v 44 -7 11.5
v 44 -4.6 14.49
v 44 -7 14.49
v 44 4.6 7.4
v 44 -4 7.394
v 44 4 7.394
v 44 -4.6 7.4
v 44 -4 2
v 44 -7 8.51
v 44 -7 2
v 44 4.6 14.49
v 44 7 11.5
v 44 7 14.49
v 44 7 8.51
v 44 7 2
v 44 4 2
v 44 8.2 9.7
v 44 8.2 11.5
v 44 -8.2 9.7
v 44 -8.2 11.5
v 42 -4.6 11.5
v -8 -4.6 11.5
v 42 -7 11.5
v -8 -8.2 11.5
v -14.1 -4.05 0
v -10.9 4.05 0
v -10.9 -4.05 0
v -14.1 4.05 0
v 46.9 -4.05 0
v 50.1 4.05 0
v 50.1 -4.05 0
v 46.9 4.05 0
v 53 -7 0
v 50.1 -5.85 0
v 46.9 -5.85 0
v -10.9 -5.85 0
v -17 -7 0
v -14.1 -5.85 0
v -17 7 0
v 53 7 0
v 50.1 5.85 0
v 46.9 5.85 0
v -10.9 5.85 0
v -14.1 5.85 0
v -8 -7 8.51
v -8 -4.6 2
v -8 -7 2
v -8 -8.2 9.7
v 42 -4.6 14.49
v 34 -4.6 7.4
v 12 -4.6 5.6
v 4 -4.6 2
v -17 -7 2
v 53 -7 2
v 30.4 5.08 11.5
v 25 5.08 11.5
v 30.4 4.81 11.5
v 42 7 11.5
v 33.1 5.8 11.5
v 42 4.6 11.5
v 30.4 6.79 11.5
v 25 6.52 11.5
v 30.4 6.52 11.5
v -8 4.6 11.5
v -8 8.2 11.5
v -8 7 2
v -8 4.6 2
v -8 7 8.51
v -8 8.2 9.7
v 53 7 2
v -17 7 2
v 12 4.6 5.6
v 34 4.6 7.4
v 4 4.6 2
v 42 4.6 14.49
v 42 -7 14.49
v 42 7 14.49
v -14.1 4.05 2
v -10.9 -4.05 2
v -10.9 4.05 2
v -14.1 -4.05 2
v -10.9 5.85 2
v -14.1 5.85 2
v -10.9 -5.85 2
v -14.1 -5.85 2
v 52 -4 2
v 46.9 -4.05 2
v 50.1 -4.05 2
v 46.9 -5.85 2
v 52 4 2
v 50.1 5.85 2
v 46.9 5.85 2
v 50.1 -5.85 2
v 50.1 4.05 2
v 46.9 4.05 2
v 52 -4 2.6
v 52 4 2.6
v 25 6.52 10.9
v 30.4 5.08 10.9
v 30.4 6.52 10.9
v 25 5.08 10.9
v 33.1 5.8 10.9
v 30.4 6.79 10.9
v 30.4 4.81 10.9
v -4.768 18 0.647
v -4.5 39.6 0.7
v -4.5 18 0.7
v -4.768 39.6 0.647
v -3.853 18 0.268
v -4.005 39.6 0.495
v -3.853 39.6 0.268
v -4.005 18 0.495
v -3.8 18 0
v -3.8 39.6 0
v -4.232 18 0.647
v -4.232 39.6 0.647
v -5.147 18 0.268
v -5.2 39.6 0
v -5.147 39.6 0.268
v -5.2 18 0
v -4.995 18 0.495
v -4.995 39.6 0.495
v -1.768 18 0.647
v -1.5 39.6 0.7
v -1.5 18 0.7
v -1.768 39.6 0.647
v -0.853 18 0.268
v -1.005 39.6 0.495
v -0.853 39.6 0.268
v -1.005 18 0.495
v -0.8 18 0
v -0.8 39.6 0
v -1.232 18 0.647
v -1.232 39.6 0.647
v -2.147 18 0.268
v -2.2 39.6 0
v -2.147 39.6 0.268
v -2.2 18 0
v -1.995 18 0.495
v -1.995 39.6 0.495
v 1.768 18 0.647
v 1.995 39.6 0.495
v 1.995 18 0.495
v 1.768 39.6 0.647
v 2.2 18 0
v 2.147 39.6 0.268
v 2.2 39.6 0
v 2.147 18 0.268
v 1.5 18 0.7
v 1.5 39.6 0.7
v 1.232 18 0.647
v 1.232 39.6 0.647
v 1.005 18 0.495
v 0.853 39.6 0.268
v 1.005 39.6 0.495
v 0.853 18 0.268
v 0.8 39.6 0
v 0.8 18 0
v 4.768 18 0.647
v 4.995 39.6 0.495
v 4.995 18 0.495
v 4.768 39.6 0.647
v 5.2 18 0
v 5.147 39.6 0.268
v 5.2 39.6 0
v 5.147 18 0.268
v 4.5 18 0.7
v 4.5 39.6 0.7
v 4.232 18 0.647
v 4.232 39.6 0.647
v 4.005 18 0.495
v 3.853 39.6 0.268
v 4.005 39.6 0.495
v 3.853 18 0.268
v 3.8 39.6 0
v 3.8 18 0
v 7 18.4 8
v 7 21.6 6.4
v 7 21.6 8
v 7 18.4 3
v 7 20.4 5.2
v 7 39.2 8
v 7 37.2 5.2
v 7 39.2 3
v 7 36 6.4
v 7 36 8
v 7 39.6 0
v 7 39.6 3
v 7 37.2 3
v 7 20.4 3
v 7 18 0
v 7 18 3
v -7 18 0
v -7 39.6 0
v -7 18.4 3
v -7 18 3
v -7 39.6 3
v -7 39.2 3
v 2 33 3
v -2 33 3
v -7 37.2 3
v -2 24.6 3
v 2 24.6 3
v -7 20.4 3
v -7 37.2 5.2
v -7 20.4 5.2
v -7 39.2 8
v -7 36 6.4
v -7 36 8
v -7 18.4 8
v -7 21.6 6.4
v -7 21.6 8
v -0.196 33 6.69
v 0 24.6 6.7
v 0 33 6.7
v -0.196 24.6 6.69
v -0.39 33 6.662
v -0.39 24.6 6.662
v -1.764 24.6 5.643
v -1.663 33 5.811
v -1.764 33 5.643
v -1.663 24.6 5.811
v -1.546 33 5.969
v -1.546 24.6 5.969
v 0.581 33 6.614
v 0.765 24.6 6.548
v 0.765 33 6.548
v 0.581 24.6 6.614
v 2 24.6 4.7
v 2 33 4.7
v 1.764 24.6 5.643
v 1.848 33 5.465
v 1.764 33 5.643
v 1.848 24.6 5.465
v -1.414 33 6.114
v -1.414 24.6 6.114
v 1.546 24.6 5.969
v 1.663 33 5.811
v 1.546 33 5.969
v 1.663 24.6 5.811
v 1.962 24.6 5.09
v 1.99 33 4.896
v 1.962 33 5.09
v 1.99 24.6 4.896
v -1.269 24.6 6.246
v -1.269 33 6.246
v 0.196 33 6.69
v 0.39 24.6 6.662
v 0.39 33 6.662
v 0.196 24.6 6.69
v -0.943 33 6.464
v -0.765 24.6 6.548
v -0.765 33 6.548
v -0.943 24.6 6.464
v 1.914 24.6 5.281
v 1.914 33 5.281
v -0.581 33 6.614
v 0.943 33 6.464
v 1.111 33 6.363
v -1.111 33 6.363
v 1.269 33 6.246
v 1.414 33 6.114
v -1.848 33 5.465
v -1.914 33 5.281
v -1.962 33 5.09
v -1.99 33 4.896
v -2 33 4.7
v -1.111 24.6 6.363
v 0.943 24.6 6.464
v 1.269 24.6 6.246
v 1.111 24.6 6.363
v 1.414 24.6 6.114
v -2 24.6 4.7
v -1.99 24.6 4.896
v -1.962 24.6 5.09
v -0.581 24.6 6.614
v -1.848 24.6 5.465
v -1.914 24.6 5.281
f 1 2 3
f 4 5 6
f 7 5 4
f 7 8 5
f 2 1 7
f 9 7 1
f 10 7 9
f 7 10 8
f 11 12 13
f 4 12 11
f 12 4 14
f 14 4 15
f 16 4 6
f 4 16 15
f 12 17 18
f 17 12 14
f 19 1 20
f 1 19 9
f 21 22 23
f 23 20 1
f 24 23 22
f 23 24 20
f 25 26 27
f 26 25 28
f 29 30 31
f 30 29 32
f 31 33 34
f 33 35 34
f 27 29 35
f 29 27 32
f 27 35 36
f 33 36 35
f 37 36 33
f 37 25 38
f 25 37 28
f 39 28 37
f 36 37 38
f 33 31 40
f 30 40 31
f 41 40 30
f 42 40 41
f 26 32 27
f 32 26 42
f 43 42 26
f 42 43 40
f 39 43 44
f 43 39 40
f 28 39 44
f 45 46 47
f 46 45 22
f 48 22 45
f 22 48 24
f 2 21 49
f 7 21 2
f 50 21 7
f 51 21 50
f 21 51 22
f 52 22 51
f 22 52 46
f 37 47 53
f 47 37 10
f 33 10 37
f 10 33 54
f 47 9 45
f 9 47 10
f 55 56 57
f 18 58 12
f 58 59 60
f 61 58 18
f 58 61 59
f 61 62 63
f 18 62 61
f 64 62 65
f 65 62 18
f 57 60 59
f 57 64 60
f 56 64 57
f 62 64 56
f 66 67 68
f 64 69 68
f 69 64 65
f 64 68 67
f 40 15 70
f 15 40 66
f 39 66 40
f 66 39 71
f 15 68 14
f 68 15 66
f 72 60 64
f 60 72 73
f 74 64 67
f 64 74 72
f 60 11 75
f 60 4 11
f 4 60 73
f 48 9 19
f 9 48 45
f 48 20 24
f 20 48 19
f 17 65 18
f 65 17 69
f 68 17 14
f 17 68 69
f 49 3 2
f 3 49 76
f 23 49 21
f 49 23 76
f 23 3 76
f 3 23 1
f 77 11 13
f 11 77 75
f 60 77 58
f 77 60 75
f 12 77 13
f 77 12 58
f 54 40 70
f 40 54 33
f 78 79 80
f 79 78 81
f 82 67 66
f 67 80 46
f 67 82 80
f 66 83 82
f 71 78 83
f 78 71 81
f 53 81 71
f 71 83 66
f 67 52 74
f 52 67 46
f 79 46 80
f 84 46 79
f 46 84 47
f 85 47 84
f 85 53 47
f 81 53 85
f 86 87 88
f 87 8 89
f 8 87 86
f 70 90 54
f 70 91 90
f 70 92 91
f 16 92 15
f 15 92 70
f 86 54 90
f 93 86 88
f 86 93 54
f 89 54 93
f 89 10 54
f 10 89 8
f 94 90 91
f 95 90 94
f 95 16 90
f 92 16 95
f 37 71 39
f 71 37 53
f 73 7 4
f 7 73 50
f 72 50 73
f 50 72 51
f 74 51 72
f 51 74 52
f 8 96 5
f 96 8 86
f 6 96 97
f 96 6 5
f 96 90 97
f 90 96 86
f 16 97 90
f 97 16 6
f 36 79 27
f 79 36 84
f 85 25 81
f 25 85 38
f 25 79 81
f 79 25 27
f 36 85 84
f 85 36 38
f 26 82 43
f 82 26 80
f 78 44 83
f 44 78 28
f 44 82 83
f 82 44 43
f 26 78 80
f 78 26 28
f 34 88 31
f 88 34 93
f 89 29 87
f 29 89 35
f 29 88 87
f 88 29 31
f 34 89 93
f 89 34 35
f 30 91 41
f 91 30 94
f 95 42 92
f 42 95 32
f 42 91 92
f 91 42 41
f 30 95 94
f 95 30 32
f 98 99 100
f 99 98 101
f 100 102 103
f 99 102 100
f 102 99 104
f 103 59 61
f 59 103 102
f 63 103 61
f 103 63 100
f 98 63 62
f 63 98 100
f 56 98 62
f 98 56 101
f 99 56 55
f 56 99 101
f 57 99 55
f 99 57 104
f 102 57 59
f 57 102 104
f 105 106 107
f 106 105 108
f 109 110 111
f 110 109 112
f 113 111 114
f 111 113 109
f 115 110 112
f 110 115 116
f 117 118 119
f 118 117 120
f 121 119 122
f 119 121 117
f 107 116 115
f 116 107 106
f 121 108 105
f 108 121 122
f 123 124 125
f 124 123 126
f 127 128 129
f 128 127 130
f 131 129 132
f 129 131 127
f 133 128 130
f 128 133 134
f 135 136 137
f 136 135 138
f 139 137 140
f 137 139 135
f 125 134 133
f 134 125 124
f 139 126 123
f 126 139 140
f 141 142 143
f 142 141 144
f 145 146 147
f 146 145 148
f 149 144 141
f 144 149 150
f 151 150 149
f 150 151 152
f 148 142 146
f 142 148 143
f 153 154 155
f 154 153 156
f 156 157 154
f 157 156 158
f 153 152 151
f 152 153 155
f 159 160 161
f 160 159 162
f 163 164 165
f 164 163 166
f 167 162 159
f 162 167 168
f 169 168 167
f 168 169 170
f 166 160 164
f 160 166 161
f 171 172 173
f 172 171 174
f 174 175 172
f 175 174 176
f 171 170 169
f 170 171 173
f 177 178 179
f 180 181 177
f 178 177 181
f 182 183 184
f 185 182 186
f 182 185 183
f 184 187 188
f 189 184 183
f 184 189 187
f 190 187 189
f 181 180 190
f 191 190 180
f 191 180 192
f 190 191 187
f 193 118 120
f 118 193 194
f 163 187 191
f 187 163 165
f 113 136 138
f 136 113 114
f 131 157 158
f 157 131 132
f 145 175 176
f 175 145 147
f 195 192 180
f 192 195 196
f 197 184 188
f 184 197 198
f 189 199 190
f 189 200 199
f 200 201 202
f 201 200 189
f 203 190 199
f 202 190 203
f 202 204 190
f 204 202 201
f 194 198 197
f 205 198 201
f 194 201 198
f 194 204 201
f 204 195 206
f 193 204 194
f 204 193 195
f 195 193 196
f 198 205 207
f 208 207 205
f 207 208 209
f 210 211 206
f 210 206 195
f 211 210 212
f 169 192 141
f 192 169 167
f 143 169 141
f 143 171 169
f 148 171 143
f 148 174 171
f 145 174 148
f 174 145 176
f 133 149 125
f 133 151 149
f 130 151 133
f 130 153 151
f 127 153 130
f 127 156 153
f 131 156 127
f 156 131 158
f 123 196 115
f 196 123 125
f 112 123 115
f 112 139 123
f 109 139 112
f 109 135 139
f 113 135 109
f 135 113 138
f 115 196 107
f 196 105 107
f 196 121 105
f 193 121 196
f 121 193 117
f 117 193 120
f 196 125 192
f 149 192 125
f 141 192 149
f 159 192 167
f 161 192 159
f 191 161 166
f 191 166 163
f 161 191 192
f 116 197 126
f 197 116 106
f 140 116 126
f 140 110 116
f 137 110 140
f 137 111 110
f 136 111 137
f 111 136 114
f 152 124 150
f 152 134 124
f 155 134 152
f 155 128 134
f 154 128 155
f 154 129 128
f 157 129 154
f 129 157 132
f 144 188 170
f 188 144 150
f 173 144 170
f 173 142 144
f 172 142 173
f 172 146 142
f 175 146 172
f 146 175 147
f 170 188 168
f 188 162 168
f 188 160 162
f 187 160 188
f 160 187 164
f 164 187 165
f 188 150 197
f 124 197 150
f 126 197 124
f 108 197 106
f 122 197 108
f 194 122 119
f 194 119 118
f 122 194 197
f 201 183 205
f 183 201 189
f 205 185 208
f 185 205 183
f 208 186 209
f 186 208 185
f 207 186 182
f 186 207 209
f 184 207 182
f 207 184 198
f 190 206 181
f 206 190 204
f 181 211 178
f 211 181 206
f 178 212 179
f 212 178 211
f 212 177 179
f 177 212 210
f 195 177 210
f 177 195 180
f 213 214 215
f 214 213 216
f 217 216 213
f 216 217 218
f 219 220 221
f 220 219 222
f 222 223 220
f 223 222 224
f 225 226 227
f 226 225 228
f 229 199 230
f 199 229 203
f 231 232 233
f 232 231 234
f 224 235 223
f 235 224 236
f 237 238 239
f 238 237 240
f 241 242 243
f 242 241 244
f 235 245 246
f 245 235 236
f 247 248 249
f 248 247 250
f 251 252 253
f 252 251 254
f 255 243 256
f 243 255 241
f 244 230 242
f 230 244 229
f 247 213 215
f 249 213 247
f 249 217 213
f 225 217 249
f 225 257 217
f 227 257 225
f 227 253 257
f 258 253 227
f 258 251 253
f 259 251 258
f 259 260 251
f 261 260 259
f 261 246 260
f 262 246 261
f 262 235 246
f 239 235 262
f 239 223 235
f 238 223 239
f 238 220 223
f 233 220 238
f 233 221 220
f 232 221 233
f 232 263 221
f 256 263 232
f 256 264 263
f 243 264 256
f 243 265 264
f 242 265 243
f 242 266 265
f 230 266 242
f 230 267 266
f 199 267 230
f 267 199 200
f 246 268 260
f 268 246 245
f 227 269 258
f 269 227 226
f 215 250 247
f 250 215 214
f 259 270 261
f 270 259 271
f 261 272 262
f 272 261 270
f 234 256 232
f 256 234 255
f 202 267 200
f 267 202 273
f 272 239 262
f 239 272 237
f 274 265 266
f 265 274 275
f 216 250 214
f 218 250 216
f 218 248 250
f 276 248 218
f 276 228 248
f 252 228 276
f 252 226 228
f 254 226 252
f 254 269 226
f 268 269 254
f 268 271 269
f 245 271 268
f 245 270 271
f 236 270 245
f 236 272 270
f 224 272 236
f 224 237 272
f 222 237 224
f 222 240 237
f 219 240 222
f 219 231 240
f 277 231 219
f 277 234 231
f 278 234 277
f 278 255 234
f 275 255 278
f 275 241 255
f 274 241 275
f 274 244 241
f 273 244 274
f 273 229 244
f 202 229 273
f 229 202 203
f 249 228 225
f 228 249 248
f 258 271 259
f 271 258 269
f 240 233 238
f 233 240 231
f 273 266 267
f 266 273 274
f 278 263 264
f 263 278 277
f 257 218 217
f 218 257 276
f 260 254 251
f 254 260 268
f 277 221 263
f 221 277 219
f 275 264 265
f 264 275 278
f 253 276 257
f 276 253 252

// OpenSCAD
// file: params.scad
// BubbleLink printed parts: shared measurements and fit settings.
//
// Every model in this folder includes this file. Edit a value here, re-run
// build.sh, and every affected STL is regenerated.
//
// Each value is tagged with where it came from:
//   [VERIFIED]  datasheet, PCB release package, or canonical-facts.md
//   [LISTING]   seller listing claim; plausible but not measured
//   [ESTIMATE]  nobody has measured it; MEASURE THE PART before a long print
//
// All dimensions in mm.

$fn = 64;

// ---------------------------------------------------------------- printing
fit_clear   = 0.30;   // clearance per side for a part dropping into a pocket
slide_clear = 0.20;   // clearance per side for the slide-clamp dovetail
ziptie_w    = 3.2;    // slot width for the narrow zip ties on hand
ziptie_t    = 1.8;    // slot thickness

// ---------------------------------------------------------------- 18650 cells
cell_d      = 18.33;  // [VERIFIED] Samsung INR18650-25R, +/-0.07
cell_h      = 64.85;  // [VERIFIED] +/-0.15
cell_bore   = 18.80;  // pocket diameter; tune with fit_coupon (18.65/18.80/18.95)
cell_pitch  = 19.90;  // centre-to-centre. Gives a ~1.6 mm wrapper gap and a
                      // printable 1.1 mm rib. Keep <= 21 so the 26 mm nickel
                      // tabs still reach both cell centres.
holder_t    = 10.0;   // spacer thickness along the cell axis
holder_lip  = 2.0;    // retaining lip under each cell end
holder_wall = 2.4;    // outer wall around the cell group
cap_window  = 12.5;   // opening in the lip for spot-welding the tabs

// ---------------------------------------------------------------- tubing
tube_od     = 5.5;    // [VERIFIED order] 3.5 ID x 5.5 OD silicone
tube_wall   = 1.0;
tube_flat_w = 8.8;    // width of the tube when pinched flat (pi*OD/2 + margin)

// ---------------------------------------------------------------- connectors
// AMASS XT30U / XT60H housings. Datasheet-nominal; tune with fit_coupon.
xt30_w      = 10.2;   // [ESTIMATE] across the housing
xt30_h      =  5.3;   // [ESTIMATE]
xt60_w      = 16.0;   // [ESTIMATE] XT60H with sheath
xt60_h      =  8.4;   // [ESTIMATE]

// ---------------------------------------------------------------- umbilical
awg16_od    = 3.2;    // [ESTIMATE] 16 AWG silicone insulation OD
awg12_od    = 4.0;    // [ESTIMATE] 12 AWG silicone insulation OD
usb_od      = 4.0;    // [ESTIMATE] LED-backpack USB cable OD
pump_od     = 2.0;    // [ESTIMATE] G528 motor lead insulation OD
paracord_d  = 4.0;    // [LISTING] 550 cord, 4 mm

// ---------------------------------------------------------------- PCB
// [VERIFIED] BubbleLink CTRL v1.2: 50 x 40 x 1.6 mm, NPTH H1-H4 3.2 mm at
// (+/-21.5, +/-16.5) from board centre.
pcb_w       = 50.0;
pcb_h       = 40.0;
pcb_hole_dx = 43.0;
pcb_hole_dy = 33.0;
pcb_hole_d  = 3.2;
pcb_standoff = 6.0;   // board underside height above the tray
// main file
// Slide clamp for the 3.5 x 5.5 mm silicone tube. Print three:
//   1x bypass restrictor (pump outlet tee -> clamp -> check valve)
//   2x channel shutoff (one per gun channel)
//
// The tube lies in a channel whose floor ramps up. A slider rides on dovetail
// rails over the channel; a rounded ridge under it squeezes the tube against
// the floor. Slide toward the tunnel end to close.
//   x = -8 .. 4    gap 6.0 mm   tube fully open (load the slider here)
//   x =  4 .. 12   gap 6.0 -> 2.4 (coarse)
//   x = 12 .. 34   gap 2.4 -> 0.6 (fine: 1 mm of travel = ~0.08 mm of gap)
//   x = 34 .. 44   gap 0.6     tube sealed (1.0 with the dovetail's play)
// Stop blocks on the wall tops halt the slider with the ridge at x = 35, in
// the sealed zone. The tube stays at the sealed-floor height to the end of
// the body, so it is never kinked. The shallow ramp is self-locking, so the
// slider stays where it is put; no screw needed.
//
// part = "body"   print upright, base on the bed
// part = "slider" print upside down, flat top on the bed
// part = "both"   plated together for one print job
// Both PETG, no supports. Tie the tube down through the tail slots.

include <params.scad>

part = "both";

wc = tube_flat_w + 0.4;    // channel width: room for the tube flattened
t  = 2.4;                  // wall thickness
H  = 9.5;                  // wall top / slider underside
nose_z = 6.0;              // lowest point of the ridge above the floor datum
lip = 1.2;                 // dovetail lip
c  = slide_clear;
yw = wc / 2 + t;           // wall outer face
base = 2.0;                // base plate thickness below the floor datum
x0 = -8; x_stop = 37; x1 = 44;   // body start, end of ramp, body end
tail = 9;

// floor height along x
fl = [[x0, 0], [4, 0], [12, 3.6], [34, 5.4], [x1, 5.4]];

module body() {
    difference() {
        union() {
            // base plate including the tie-down tails
            translate([x0 - tail, -yw, -base]) cube([x1 - x0 + 2 * tail, 2 * yw, base]);
            // walls
            for (s = [-1, 1]) translate([x0, s > 0 ? wc / 2 : -yw, -base])
                cube([x1 - x0, t, H + base]);
            // dovetail lips with a 45-degree underside
            for (s = [-1, 1]) mirror([0, s > 0 ? 0 : 1, 0])
                translate([x0, 0, 0]) rotate([90, 0, 90])
                    linear_extrude(x1 - x0)
                        polygon([[yw - 0.01, H - 3], [yw + lip, H - 3 + lip],
                                 [yw + lip, H], [yw - 0.01, H]]);
            // ramp floor
            rotate([90, 0, 0]) translate([0, 0, -wc / 2 - 0.01])
                linear_extrude(wc + 0.02)
                    polygon(concat([[x0, -0.01]], fl, [[x1, -0.01]]));
            // exit ramp on the tail, so the tube eases back down to the
            // tie-down level instead of kinking over the end of the floor
            rotate([90, 0, 0]) translate([0, 0, -wc / 2 + 0.6])
                linear_extrude(wc - 1.2)
                    polygon([[x1 - 0.01, -0.01], [x1 - 0.01, 5.4], [x1 + tail - 1, 0.6], [x1 + tail - 1, -0.01]]);
            // stop blocks on the wall tops: the slider plate hits them with
            // its ridge at x = 35, inside the sealed zone
            for (s = [-1, 1]) translate([x_stop + sl_len / 2 - 2, s > 0 ? wc / 2 : -yw, H - 0.01])
                cube([x1 - (x_stop + sl_len / 2 - 2), t, 3]);
        }
        // tie-down slots in the tails, either side of the tube
        for (x = [x0 - tail / 2, x1 + tail / 2], s = [-1, 1])
            translate([x, s * (tube_od / 2 + 2.2), 0])
                cube([ziptie_w, ziptie_t, 3 * base + 2], center = true);
        // arrow on the wall top pointing toward "closed"
        translate([x_stop - 12, yw - t / 2, H - 0.6])
            linear_extrude(1) polygon([[0, -0.8], [6, -0.8], [6, -1.1], [9, 0], [6, 1.1], [6, 0.8], [0, 0.8]] * 0.9);
    }
}

sl_len = 14;
sk = 2.0;                  // skirt thickness
yo = yw + lip + c + sk;    // slider outer half-width

module slider() {
    // modelled in its working position, ridge centre at x = 0
    union() {
        difference() {
            translate([-sl_len / 2, -yo - 0.4, H + c]) cube([sl_len, 2 * yo + 0.8, 3]);
            // thumb grip grooves
            for (x = [-4.5 : 3 : 4.5]) translate([x, 0, H + c + 3])
                rotate([90, 0, 0]) cylinder(d = 1.4, h = 2 * yo + 2, center = true, $fn = 16);
        }
        for (s = [-1, 1]) mirror([0, s > 0 ? 0 : 1, 0])
            translate([-sl_len / 2, 0, 0]) rotate([90, 0, 90]) linear_extrude(sl_len)
                polygon([
                    [yw + lip + c,      H + c + 0.5],
                    [yw + lip + c,      H - 1.8 - c],          // under the lip
                    [yw + c,            H - 3 - c],
                    [yw + c,            H - 3 - c - 1.6],
                    [yo,                H - 3 - c - 1.6],
                    [yo,                H + c + 0.5]]);
        // ridge: rounded nose, flat back up to the plate
        hull() {
            translate([0, 0, nose_z + 2]) rotate([90, 0, 0])
                cylinder(r = 2, h = wc - 2 * c - 0.4, center = true);
            translate([-2, -(wc - 2 * c - 0.4) / 2, H + c]) cube([4, wc - 2 * c - 0.4, 0.01]);
        }
    }
}

if (part == "body") translate([0, 0, base]) body();
else if (part == "slider") translate([0, 0, H + c + 3]) rotate([180, 0, 0]) slider();
else {
    translate([0, 0, base]) body();
    translate([0, 2 * yo + 8, H + c + 3]) rotate([180, 0, 0]) slider();
}
